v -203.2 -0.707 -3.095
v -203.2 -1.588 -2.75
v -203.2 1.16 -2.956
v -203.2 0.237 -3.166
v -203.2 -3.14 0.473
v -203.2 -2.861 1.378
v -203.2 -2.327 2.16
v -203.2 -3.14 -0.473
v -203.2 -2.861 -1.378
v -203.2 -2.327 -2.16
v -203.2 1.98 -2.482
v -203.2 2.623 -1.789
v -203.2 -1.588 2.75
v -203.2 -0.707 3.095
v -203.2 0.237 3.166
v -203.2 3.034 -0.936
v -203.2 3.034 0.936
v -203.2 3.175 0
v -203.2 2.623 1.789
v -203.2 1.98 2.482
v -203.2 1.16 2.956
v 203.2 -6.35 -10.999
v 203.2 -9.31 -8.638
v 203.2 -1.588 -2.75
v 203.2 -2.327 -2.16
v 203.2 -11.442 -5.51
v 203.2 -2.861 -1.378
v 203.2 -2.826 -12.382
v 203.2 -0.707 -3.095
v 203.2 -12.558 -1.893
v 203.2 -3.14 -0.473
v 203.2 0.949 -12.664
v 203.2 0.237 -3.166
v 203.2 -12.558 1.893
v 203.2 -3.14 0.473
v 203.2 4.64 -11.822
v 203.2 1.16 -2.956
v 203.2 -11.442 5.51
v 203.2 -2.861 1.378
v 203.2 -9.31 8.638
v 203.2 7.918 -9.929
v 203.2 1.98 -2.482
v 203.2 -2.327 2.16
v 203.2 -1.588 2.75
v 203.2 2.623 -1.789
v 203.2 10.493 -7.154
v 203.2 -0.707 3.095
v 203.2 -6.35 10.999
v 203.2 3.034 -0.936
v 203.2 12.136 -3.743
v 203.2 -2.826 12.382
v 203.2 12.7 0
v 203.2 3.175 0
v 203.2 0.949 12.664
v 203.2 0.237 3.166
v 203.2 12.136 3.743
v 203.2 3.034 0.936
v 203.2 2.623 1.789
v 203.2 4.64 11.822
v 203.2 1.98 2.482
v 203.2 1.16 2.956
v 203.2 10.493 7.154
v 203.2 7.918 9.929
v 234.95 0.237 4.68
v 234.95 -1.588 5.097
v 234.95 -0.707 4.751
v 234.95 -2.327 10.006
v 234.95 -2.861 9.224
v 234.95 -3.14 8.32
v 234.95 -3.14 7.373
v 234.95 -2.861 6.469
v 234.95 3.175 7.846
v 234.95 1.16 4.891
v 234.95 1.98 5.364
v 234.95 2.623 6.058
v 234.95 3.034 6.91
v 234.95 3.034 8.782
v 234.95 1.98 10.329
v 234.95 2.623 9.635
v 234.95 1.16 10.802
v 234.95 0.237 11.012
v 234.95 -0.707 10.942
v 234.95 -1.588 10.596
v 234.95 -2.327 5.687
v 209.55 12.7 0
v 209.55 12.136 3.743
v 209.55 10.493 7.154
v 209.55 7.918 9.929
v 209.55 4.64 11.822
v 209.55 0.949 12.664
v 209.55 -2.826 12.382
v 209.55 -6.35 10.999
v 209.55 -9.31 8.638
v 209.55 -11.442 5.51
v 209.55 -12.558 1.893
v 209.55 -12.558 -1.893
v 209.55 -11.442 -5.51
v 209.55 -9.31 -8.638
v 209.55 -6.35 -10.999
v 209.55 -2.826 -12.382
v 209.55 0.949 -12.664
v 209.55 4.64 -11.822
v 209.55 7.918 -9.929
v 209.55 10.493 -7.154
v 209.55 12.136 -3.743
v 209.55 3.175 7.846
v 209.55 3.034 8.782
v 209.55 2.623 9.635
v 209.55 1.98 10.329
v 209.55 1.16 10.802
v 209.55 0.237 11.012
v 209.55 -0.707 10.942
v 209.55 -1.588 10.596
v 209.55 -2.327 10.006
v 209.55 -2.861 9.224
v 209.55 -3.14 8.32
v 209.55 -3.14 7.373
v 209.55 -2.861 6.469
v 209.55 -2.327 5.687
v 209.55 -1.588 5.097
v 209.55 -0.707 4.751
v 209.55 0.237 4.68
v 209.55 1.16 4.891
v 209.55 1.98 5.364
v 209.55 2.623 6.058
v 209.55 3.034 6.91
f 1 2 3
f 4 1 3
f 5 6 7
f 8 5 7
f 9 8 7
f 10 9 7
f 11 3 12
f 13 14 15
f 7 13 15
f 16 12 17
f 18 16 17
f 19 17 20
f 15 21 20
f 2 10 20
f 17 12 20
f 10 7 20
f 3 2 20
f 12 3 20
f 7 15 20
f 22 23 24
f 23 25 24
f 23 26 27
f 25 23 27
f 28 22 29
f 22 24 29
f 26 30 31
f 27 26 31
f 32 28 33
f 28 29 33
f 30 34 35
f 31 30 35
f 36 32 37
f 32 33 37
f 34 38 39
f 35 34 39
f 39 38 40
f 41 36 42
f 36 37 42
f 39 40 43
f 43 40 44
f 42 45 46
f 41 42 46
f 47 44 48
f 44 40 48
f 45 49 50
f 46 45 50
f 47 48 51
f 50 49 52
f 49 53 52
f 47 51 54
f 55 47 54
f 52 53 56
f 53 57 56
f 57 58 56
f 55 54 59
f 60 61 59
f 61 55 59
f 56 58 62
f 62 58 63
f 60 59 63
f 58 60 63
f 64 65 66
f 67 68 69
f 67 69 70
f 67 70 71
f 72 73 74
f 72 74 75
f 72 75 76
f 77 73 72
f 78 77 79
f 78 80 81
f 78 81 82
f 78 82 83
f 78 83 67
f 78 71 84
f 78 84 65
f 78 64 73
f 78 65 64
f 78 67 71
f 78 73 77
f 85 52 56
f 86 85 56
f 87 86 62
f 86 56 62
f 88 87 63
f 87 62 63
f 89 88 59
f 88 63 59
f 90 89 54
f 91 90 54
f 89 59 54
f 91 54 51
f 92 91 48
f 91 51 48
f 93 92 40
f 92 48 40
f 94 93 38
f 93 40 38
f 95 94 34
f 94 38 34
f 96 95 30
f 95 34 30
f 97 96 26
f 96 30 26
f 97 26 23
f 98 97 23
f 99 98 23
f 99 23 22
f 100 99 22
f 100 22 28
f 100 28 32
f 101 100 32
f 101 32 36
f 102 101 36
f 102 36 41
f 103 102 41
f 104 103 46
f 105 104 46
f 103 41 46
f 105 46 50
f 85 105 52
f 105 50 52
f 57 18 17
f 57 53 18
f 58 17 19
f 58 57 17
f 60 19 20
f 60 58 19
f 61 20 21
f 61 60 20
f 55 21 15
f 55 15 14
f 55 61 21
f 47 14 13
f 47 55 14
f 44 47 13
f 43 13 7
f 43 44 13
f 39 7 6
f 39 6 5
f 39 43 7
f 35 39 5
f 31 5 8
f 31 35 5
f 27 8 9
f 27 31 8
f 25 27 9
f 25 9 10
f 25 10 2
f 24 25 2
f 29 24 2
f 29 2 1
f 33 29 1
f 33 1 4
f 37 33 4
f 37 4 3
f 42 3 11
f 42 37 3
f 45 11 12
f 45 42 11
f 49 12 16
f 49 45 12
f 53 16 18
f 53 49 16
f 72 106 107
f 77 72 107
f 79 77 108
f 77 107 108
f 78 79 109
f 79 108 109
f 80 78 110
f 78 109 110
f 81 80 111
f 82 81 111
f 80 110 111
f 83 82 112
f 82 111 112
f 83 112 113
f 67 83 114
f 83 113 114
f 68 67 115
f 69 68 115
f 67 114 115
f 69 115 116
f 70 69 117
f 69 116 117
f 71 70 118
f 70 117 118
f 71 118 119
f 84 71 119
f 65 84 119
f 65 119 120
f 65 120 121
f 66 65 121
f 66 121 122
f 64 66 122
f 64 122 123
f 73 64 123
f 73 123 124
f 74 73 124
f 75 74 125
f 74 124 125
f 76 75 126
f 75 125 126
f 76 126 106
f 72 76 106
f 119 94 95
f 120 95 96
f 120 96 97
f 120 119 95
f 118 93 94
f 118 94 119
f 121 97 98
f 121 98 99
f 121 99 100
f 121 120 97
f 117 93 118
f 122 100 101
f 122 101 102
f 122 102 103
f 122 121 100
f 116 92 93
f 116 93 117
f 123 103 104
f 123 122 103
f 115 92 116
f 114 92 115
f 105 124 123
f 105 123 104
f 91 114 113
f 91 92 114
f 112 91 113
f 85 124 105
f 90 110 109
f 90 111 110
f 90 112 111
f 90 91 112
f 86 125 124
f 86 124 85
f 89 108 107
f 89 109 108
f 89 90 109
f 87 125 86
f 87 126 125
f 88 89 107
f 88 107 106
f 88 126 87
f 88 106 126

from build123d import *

# Parameters (mm, degrees)
F0_R     = 3.175
F1_DEPTH = 203.2
F2_R     = 12.7
F3_DEPTH = 6.35
F4_R     = 3.175
F5_DEPTH = 25.4


with BuildPart() as f1:
    # F0 (on Right) → F1 (new body, symmetric)
    with BuildSketch(Plane.YZ):
        Circle(F0_R)
    extrude(amount=F1_DEPTH, both=True)

    # F2 (on face) → F3 (join)
    with BuildSketch(Plane.YZ.offset(203.2)):
        Circle(F2_R)
    extrude(amount=F3_DEPTH)

    # F4 (on face) → F5 (join)
    with BuildSketch(Plane.YZ.offset(209.55)):
        with Locations((0, 7.846299)):
            Circle(F4_R)
    extrude(amount=F5_DEPTH)


solid = f1.part
